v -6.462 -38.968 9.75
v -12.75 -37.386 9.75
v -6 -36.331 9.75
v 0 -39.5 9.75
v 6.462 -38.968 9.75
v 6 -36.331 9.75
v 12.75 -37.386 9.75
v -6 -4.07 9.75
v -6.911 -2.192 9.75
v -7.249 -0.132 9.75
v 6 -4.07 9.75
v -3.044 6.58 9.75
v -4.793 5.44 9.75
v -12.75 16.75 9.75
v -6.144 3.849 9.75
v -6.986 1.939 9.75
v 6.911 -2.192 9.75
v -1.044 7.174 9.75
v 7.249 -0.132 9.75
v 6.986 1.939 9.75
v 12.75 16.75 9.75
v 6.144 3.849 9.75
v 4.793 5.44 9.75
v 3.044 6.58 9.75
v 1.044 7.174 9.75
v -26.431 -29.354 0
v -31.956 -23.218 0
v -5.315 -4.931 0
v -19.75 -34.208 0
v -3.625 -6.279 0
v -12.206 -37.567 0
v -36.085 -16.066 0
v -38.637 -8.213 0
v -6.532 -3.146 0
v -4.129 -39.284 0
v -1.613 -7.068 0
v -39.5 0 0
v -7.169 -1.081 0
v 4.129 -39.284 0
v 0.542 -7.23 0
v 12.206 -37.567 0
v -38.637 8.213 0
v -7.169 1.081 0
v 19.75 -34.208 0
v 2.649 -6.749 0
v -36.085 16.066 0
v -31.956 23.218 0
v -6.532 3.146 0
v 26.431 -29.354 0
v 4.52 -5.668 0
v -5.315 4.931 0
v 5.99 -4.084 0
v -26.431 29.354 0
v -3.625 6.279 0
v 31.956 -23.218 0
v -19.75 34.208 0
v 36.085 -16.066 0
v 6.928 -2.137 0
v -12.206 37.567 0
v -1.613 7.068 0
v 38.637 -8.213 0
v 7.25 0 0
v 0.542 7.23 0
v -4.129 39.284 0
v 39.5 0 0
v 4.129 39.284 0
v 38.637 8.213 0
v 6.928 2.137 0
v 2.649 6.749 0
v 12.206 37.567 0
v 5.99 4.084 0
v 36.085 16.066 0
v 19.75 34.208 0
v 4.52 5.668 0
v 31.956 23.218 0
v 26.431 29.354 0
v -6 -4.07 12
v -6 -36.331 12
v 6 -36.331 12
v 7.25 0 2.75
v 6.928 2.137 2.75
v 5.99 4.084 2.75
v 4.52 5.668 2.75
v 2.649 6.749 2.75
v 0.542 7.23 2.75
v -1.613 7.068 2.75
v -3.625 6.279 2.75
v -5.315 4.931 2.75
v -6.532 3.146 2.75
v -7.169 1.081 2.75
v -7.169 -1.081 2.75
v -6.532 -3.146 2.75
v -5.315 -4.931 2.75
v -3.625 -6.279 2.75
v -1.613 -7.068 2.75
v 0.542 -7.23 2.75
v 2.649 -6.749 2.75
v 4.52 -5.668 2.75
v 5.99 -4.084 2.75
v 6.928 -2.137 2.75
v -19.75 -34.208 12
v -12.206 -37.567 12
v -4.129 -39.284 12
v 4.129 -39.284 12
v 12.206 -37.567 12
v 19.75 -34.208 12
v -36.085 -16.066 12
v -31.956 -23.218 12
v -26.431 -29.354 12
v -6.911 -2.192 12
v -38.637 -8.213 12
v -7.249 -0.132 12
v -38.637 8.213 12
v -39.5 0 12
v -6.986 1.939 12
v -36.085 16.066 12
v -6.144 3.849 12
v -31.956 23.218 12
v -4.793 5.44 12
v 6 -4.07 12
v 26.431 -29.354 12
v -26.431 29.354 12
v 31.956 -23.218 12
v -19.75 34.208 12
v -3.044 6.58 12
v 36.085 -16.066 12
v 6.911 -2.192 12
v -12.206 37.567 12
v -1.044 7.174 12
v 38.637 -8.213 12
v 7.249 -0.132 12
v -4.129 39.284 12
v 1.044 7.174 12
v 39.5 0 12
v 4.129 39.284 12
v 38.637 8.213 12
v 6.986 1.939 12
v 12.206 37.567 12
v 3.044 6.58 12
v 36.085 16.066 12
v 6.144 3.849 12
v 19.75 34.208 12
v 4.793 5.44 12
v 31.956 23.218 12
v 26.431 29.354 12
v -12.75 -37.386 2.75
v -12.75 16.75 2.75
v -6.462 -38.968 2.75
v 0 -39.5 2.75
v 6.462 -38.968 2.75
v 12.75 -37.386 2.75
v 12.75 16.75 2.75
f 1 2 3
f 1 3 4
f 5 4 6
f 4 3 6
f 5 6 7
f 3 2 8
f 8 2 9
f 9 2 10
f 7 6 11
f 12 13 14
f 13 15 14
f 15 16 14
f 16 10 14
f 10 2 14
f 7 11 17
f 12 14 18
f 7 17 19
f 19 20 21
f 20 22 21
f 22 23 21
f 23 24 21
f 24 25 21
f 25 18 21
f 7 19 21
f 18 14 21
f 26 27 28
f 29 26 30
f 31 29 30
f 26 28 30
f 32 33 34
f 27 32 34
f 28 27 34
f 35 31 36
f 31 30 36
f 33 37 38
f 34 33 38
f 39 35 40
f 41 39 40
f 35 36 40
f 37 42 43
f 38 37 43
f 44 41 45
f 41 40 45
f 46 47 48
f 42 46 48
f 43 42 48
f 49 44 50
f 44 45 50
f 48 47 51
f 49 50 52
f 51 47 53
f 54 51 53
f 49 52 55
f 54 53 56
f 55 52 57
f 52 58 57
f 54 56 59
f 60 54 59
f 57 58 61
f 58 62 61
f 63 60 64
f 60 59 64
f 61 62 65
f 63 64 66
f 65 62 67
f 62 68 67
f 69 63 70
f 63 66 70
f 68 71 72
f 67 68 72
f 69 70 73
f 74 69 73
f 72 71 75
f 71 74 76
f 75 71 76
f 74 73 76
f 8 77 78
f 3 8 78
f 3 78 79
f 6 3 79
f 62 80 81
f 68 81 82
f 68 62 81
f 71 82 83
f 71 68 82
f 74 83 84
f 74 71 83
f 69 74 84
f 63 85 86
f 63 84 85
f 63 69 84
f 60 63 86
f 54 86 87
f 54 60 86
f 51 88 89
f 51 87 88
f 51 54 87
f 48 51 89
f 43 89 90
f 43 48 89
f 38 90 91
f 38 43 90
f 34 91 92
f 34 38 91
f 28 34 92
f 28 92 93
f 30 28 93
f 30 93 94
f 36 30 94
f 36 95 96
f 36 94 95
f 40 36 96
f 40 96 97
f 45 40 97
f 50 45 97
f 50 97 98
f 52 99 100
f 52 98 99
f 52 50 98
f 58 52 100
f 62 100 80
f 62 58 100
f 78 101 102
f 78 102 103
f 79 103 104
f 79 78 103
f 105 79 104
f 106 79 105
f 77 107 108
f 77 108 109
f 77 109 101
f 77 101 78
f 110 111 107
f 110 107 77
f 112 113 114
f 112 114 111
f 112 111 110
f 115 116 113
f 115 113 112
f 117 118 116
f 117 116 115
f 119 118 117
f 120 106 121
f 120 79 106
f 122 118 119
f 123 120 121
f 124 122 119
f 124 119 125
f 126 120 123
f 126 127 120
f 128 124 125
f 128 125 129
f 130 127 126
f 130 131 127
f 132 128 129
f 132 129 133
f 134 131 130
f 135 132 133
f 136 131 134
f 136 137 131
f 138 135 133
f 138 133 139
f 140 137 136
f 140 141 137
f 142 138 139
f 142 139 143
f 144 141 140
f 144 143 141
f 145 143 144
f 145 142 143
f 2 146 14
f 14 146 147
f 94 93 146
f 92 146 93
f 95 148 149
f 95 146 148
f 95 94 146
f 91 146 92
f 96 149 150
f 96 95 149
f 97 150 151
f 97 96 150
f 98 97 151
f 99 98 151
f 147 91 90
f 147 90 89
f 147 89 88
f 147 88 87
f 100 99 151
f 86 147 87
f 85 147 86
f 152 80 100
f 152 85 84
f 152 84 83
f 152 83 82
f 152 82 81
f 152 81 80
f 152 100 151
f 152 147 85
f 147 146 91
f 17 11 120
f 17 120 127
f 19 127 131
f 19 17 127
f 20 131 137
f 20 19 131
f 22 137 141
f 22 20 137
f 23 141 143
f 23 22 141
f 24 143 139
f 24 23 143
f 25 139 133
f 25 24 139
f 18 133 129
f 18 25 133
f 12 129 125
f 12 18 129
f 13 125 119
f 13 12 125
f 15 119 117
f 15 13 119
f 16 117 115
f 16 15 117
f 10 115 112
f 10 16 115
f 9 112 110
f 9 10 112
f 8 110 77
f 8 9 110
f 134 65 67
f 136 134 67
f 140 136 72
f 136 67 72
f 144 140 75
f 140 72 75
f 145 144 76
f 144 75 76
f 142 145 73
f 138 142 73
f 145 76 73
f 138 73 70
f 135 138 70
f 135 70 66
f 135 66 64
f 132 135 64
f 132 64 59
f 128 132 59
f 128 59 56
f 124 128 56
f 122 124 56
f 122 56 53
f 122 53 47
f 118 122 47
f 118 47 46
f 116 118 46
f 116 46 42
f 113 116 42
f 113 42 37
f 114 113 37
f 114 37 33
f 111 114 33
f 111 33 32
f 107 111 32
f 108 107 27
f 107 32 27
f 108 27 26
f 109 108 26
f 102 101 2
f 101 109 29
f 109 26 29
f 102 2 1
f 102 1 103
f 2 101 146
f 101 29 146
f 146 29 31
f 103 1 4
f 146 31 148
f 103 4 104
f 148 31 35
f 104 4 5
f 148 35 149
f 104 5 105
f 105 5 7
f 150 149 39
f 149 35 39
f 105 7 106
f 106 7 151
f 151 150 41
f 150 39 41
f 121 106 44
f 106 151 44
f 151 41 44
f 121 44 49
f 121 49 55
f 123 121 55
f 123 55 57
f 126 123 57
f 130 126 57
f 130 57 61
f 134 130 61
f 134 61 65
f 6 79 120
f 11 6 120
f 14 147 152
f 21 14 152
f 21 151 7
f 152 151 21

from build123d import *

# Parameters (mm, degrees)
F0_R     = 39.5
F0_R_2   = 7.25
F1_DEPTH = 12
F4_W     = 25.5
F4_H     = 66.75
F5_DEPTH = 7
F7_DEPTH = 5


with BuildPart() as f1:
    # F0 (on Top) → F1 (new body)
    with BuildSketch(Plane.XY):
        Circle(F0_R)
        Circle(F0_R_2, mode=Mode.SUBTRACT)
    extrude(amount=F1_DEPTH)

    # F4 (on offset) → F5 (cut)
    with BuildSketch(Plane.XY.offset(2.75)):
        with Locations((0, -16.625)):
            Rectangle(F4_W, F4_H)
    extrude(amount=F5_DEPTH, mode=Mode.SUBTRACT)

    # F6 (on face) → F7 (cut)
    with BuildSketch(Plane.XY.offset(12)):
        with BuildLine():
            Line((6, -36.331318), (6, 0))
            ThreePointArc((6, 0), (0, 6), (-6, 0))
            Line((-6, 0), (-6, -36.331318))
            Line((-6, -36.331318), (6, -36.331318))
        make_face()
    extrude(amount=-F7_DEPTH, mode=Mode.SUBTRACT)


solid = f1.part
